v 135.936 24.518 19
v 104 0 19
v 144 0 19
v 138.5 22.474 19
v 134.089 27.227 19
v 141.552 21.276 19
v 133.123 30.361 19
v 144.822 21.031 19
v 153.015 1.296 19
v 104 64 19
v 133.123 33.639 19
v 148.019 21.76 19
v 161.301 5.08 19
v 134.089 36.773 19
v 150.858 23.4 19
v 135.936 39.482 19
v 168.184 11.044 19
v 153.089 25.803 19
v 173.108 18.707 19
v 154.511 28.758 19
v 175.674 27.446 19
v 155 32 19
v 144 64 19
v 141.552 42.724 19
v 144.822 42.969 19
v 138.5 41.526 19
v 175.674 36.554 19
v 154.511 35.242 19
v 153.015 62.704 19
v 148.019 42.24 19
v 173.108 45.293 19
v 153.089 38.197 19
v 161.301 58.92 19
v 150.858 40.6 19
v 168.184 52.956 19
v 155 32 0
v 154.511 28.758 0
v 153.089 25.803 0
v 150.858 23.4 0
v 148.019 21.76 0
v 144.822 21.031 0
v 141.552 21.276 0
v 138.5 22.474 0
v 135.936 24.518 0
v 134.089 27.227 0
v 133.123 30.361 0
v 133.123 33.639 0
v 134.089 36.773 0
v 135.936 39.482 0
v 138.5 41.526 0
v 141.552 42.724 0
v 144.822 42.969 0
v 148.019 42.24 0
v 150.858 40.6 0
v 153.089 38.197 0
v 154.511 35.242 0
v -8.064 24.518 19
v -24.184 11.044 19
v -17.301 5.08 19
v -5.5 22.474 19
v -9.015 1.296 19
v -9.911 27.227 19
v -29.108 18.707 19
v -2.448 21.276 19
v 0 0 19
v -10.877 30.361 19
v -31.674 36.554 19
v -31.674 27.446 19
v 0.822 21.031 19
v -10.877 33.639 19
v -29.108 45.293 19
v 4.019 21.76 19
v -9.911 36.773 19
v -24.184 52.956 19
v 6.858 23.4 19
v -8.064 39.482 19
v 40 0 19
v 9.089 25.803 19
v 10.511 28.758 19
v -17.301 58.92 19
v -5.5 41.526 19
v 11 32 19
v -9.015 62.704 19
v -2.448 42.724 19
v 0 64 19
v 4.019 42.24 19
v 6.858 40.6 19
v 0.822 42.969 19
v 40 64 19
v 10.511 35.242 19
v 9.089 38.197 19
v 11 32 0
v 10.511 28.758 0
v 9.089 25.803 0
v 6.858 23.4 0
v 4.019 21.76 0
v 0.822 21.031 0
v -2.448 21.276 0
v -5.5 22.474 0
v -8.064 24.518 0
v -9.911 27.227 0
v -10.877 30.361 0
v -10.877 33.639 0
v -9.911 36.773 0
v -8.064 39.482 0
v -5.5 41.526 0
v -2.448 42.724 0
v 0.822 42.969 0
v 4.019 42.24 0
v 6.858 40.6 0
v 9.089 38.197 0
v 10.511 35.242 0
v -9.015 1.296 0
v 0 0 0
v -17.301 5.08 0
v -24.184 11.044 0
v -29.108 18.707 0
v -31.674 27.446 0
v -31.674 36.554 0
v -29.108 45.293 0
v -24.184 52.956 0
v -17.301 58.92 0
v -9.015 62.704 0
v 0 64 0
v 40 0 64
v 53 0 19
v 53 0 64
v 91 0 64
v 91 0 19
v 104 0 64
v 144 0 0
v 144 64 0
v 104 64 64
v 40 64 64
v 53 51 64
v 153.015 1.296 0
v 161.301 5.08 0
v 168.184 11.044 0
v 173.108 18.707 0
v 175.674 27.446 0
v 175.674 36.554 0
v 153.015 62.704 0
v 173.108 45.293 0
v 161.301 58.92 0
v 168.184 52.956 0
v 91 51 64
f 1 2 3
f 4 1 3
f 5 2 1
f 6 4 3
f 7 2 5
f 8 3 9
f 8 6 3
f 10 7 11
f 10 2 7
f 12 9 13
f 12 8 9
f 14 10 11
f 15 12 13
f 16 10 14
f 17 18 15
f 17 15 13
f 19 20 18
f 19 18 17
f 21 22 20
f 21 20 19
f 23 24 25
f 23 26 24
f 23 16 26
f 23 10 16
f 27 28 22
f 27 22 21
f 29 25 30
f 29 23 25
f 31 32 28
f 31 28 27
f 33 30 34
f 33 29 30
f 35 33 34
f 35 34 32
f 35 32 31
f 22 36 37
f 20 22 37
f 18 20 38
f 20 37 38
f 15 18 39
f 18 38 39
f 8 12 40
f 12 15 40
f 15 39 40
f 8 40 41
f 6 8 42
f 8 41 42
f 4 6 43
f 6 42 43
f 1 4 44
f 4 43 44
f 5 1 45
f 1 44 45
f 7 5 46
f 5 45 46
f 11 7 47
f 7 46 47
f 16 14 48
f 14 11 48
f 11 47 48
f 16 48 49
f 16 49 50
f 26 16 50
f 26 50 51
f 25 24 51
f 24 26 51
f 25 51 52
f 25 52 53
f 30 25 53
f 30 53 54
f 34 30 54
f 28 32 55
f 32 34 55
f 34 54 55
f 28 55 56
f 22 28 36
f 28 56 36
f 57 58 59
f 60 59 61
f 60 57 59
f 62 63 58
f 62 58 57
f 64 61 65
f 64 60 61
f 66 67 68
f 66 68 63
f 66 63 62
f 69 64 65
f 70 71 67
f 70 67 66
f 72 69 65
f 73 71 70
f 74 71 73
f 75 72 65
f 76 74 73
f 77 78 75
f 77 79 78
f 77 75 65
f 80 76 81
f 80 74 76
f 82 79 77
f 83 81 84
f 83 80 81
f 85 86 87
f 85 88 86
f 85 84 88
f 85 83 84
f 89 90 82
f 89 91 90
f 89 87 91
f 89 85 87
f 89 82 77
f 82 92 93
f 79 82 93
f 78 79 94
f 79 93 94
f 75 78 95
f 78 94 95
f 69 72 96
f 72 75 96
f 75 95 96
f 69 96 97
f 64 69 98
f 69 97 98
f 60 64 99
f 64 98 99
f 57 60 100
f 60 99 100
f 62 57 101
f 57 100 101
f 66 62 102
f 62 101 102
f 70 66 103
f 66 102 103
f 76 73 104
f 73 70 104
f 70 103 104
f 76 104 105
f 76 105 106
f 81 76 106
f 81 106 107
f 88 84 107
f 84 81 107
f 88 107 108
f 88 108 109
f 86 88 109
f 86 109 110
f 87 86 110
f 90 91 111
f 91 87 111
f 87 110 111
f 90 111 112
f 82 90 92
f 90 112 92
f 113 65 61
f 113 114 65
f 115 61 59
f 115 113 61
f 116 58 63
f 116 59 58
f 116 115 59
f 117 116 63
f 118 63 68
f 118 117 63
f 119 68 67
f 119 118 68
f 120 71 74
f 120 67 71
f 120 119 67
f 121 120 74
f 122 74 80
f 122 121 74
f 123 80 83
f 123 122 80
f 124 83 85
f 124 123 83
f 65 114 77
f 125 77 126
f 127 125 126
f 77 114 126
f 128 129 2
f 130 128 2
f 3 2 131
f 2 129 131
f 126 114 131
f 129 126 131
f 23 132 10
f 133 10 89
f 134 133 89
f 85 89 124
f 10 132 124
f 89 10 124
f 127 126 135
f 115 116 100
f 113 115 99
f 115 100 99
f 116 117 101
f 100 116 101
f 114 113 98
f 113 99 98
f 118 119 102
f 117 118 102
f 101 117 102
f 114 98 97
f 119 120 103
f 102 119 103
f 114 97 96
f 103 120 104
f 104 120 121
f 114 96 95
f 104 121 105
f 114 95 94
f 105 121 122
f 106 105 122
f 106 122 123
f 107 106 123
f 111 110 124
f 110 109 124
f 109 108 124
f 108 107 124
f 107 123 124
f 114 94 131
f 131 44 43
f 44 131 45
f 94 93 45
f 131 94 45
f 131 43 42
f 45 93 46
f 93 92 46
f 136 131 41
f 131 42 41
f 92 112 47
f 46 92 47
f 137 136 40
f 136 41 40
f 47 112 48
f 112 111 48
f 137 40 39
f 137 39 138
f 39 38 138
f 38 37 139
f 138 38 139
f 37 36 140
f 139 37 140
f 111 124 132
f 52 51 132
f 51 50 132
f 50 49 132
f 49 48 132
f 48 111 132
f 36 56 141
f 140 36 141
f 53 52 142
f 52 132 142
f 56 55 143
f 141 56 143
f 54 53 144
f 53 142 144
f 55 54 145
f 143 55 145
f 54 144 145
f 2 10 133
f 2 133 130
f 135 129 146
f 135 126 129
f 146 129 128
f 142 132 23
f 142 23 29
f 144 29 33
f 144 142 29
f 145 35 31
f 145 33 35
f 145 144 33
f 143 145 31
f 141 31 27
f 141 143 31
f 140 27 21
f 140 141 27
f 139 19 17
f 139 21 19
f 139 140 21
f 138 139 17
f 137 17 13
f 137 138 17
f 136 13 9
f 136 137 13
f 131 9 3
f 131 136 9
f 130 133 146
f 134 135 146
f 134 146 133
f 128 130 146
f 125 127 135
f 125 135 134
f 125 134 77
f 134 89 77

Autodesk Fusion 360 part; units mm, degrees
sketch "Sketch1" plane through (0, 0, 0) normal (0, 0, 1) x (1, 0, 0)
  line L0 (0, 0) -> (144, 0)
  line L1 (144, 64) -> (0, 64)
  circle A0 centre (144, 32) radius 11
  circle A1 centre (0, 32) radius 11
  arc A2 (0, 64) -> (0, 0) centre (0, 32) ccw
  arc A3 (144, 0) -> (144, 64) centre (144, 32) ccw
extrude "Extrude1" add sketch "Sketch1" along normal blind 19
sketch "Sketch2" plane through (0, 0, 19) normal (0, 0, 1) x (-1, 0, 0)
  circle A0 centre (-144, -32) radius 11
  circle A1 centre (0, -32) radius 11
  arc A2 (-144, 0) -> (-144, -64) centre (-144, -32) ccw
  line L0 (-144, -64) -> (0, -64)
  arc A3 (0, -64) -> (0, 0) centre (0, -32) ccw
  line L1 (0, 0) -> (-144, 0)
  line L2 (-72, -64) -> (-104, -64)
  line L3 (-104, -64) -> (-104, 0)
  line L4 (-104, 0) -> (-91, 0)
  line L5 (-91, 0) -> (-91, -51)
  line L6 (-91, -51) -> (-72, -51)
  line L7 (-40, 0) -> (-53, 0)
  line L8 (-53, 0) -> (-53, -51)
  line L9 (-53, -51) -> (-72, -51)
  line L10 (-72, -64) -> (-40, -64)
  line L11 (-40, -64) -> (-40, 0)
  dimension "d7" = 32
  dimension "d8" = 13
  dimension "d9" = 51
extrude "Extrude2" add sketch "Sketch2" along normal blind 45 contours L0 L1 L2 L3 L4 L5 L6 L7 L8 L9 L10 L11
sketch "Sketch3" plane through (53, 0, 0) normal (1, 0, 0) x (0, 1, 0)
  line L0 (0, 19) -> (51, 19)
  line L1 (51, 19) -> (51, 64)
  line L2 (51, 64) -> (0, 64)
  line L3 (0, 64) -> (0, 19)
  line L4 (0, 19) -> (51, 64)
  line L5 (51, 64) -> (51, 19)
  line L6 (0, 19) -> (51, 19)
extrude "Extrude3" add sketch "Sketch3" along normal blind 50 contours L0 L1 L4 L5 L6
